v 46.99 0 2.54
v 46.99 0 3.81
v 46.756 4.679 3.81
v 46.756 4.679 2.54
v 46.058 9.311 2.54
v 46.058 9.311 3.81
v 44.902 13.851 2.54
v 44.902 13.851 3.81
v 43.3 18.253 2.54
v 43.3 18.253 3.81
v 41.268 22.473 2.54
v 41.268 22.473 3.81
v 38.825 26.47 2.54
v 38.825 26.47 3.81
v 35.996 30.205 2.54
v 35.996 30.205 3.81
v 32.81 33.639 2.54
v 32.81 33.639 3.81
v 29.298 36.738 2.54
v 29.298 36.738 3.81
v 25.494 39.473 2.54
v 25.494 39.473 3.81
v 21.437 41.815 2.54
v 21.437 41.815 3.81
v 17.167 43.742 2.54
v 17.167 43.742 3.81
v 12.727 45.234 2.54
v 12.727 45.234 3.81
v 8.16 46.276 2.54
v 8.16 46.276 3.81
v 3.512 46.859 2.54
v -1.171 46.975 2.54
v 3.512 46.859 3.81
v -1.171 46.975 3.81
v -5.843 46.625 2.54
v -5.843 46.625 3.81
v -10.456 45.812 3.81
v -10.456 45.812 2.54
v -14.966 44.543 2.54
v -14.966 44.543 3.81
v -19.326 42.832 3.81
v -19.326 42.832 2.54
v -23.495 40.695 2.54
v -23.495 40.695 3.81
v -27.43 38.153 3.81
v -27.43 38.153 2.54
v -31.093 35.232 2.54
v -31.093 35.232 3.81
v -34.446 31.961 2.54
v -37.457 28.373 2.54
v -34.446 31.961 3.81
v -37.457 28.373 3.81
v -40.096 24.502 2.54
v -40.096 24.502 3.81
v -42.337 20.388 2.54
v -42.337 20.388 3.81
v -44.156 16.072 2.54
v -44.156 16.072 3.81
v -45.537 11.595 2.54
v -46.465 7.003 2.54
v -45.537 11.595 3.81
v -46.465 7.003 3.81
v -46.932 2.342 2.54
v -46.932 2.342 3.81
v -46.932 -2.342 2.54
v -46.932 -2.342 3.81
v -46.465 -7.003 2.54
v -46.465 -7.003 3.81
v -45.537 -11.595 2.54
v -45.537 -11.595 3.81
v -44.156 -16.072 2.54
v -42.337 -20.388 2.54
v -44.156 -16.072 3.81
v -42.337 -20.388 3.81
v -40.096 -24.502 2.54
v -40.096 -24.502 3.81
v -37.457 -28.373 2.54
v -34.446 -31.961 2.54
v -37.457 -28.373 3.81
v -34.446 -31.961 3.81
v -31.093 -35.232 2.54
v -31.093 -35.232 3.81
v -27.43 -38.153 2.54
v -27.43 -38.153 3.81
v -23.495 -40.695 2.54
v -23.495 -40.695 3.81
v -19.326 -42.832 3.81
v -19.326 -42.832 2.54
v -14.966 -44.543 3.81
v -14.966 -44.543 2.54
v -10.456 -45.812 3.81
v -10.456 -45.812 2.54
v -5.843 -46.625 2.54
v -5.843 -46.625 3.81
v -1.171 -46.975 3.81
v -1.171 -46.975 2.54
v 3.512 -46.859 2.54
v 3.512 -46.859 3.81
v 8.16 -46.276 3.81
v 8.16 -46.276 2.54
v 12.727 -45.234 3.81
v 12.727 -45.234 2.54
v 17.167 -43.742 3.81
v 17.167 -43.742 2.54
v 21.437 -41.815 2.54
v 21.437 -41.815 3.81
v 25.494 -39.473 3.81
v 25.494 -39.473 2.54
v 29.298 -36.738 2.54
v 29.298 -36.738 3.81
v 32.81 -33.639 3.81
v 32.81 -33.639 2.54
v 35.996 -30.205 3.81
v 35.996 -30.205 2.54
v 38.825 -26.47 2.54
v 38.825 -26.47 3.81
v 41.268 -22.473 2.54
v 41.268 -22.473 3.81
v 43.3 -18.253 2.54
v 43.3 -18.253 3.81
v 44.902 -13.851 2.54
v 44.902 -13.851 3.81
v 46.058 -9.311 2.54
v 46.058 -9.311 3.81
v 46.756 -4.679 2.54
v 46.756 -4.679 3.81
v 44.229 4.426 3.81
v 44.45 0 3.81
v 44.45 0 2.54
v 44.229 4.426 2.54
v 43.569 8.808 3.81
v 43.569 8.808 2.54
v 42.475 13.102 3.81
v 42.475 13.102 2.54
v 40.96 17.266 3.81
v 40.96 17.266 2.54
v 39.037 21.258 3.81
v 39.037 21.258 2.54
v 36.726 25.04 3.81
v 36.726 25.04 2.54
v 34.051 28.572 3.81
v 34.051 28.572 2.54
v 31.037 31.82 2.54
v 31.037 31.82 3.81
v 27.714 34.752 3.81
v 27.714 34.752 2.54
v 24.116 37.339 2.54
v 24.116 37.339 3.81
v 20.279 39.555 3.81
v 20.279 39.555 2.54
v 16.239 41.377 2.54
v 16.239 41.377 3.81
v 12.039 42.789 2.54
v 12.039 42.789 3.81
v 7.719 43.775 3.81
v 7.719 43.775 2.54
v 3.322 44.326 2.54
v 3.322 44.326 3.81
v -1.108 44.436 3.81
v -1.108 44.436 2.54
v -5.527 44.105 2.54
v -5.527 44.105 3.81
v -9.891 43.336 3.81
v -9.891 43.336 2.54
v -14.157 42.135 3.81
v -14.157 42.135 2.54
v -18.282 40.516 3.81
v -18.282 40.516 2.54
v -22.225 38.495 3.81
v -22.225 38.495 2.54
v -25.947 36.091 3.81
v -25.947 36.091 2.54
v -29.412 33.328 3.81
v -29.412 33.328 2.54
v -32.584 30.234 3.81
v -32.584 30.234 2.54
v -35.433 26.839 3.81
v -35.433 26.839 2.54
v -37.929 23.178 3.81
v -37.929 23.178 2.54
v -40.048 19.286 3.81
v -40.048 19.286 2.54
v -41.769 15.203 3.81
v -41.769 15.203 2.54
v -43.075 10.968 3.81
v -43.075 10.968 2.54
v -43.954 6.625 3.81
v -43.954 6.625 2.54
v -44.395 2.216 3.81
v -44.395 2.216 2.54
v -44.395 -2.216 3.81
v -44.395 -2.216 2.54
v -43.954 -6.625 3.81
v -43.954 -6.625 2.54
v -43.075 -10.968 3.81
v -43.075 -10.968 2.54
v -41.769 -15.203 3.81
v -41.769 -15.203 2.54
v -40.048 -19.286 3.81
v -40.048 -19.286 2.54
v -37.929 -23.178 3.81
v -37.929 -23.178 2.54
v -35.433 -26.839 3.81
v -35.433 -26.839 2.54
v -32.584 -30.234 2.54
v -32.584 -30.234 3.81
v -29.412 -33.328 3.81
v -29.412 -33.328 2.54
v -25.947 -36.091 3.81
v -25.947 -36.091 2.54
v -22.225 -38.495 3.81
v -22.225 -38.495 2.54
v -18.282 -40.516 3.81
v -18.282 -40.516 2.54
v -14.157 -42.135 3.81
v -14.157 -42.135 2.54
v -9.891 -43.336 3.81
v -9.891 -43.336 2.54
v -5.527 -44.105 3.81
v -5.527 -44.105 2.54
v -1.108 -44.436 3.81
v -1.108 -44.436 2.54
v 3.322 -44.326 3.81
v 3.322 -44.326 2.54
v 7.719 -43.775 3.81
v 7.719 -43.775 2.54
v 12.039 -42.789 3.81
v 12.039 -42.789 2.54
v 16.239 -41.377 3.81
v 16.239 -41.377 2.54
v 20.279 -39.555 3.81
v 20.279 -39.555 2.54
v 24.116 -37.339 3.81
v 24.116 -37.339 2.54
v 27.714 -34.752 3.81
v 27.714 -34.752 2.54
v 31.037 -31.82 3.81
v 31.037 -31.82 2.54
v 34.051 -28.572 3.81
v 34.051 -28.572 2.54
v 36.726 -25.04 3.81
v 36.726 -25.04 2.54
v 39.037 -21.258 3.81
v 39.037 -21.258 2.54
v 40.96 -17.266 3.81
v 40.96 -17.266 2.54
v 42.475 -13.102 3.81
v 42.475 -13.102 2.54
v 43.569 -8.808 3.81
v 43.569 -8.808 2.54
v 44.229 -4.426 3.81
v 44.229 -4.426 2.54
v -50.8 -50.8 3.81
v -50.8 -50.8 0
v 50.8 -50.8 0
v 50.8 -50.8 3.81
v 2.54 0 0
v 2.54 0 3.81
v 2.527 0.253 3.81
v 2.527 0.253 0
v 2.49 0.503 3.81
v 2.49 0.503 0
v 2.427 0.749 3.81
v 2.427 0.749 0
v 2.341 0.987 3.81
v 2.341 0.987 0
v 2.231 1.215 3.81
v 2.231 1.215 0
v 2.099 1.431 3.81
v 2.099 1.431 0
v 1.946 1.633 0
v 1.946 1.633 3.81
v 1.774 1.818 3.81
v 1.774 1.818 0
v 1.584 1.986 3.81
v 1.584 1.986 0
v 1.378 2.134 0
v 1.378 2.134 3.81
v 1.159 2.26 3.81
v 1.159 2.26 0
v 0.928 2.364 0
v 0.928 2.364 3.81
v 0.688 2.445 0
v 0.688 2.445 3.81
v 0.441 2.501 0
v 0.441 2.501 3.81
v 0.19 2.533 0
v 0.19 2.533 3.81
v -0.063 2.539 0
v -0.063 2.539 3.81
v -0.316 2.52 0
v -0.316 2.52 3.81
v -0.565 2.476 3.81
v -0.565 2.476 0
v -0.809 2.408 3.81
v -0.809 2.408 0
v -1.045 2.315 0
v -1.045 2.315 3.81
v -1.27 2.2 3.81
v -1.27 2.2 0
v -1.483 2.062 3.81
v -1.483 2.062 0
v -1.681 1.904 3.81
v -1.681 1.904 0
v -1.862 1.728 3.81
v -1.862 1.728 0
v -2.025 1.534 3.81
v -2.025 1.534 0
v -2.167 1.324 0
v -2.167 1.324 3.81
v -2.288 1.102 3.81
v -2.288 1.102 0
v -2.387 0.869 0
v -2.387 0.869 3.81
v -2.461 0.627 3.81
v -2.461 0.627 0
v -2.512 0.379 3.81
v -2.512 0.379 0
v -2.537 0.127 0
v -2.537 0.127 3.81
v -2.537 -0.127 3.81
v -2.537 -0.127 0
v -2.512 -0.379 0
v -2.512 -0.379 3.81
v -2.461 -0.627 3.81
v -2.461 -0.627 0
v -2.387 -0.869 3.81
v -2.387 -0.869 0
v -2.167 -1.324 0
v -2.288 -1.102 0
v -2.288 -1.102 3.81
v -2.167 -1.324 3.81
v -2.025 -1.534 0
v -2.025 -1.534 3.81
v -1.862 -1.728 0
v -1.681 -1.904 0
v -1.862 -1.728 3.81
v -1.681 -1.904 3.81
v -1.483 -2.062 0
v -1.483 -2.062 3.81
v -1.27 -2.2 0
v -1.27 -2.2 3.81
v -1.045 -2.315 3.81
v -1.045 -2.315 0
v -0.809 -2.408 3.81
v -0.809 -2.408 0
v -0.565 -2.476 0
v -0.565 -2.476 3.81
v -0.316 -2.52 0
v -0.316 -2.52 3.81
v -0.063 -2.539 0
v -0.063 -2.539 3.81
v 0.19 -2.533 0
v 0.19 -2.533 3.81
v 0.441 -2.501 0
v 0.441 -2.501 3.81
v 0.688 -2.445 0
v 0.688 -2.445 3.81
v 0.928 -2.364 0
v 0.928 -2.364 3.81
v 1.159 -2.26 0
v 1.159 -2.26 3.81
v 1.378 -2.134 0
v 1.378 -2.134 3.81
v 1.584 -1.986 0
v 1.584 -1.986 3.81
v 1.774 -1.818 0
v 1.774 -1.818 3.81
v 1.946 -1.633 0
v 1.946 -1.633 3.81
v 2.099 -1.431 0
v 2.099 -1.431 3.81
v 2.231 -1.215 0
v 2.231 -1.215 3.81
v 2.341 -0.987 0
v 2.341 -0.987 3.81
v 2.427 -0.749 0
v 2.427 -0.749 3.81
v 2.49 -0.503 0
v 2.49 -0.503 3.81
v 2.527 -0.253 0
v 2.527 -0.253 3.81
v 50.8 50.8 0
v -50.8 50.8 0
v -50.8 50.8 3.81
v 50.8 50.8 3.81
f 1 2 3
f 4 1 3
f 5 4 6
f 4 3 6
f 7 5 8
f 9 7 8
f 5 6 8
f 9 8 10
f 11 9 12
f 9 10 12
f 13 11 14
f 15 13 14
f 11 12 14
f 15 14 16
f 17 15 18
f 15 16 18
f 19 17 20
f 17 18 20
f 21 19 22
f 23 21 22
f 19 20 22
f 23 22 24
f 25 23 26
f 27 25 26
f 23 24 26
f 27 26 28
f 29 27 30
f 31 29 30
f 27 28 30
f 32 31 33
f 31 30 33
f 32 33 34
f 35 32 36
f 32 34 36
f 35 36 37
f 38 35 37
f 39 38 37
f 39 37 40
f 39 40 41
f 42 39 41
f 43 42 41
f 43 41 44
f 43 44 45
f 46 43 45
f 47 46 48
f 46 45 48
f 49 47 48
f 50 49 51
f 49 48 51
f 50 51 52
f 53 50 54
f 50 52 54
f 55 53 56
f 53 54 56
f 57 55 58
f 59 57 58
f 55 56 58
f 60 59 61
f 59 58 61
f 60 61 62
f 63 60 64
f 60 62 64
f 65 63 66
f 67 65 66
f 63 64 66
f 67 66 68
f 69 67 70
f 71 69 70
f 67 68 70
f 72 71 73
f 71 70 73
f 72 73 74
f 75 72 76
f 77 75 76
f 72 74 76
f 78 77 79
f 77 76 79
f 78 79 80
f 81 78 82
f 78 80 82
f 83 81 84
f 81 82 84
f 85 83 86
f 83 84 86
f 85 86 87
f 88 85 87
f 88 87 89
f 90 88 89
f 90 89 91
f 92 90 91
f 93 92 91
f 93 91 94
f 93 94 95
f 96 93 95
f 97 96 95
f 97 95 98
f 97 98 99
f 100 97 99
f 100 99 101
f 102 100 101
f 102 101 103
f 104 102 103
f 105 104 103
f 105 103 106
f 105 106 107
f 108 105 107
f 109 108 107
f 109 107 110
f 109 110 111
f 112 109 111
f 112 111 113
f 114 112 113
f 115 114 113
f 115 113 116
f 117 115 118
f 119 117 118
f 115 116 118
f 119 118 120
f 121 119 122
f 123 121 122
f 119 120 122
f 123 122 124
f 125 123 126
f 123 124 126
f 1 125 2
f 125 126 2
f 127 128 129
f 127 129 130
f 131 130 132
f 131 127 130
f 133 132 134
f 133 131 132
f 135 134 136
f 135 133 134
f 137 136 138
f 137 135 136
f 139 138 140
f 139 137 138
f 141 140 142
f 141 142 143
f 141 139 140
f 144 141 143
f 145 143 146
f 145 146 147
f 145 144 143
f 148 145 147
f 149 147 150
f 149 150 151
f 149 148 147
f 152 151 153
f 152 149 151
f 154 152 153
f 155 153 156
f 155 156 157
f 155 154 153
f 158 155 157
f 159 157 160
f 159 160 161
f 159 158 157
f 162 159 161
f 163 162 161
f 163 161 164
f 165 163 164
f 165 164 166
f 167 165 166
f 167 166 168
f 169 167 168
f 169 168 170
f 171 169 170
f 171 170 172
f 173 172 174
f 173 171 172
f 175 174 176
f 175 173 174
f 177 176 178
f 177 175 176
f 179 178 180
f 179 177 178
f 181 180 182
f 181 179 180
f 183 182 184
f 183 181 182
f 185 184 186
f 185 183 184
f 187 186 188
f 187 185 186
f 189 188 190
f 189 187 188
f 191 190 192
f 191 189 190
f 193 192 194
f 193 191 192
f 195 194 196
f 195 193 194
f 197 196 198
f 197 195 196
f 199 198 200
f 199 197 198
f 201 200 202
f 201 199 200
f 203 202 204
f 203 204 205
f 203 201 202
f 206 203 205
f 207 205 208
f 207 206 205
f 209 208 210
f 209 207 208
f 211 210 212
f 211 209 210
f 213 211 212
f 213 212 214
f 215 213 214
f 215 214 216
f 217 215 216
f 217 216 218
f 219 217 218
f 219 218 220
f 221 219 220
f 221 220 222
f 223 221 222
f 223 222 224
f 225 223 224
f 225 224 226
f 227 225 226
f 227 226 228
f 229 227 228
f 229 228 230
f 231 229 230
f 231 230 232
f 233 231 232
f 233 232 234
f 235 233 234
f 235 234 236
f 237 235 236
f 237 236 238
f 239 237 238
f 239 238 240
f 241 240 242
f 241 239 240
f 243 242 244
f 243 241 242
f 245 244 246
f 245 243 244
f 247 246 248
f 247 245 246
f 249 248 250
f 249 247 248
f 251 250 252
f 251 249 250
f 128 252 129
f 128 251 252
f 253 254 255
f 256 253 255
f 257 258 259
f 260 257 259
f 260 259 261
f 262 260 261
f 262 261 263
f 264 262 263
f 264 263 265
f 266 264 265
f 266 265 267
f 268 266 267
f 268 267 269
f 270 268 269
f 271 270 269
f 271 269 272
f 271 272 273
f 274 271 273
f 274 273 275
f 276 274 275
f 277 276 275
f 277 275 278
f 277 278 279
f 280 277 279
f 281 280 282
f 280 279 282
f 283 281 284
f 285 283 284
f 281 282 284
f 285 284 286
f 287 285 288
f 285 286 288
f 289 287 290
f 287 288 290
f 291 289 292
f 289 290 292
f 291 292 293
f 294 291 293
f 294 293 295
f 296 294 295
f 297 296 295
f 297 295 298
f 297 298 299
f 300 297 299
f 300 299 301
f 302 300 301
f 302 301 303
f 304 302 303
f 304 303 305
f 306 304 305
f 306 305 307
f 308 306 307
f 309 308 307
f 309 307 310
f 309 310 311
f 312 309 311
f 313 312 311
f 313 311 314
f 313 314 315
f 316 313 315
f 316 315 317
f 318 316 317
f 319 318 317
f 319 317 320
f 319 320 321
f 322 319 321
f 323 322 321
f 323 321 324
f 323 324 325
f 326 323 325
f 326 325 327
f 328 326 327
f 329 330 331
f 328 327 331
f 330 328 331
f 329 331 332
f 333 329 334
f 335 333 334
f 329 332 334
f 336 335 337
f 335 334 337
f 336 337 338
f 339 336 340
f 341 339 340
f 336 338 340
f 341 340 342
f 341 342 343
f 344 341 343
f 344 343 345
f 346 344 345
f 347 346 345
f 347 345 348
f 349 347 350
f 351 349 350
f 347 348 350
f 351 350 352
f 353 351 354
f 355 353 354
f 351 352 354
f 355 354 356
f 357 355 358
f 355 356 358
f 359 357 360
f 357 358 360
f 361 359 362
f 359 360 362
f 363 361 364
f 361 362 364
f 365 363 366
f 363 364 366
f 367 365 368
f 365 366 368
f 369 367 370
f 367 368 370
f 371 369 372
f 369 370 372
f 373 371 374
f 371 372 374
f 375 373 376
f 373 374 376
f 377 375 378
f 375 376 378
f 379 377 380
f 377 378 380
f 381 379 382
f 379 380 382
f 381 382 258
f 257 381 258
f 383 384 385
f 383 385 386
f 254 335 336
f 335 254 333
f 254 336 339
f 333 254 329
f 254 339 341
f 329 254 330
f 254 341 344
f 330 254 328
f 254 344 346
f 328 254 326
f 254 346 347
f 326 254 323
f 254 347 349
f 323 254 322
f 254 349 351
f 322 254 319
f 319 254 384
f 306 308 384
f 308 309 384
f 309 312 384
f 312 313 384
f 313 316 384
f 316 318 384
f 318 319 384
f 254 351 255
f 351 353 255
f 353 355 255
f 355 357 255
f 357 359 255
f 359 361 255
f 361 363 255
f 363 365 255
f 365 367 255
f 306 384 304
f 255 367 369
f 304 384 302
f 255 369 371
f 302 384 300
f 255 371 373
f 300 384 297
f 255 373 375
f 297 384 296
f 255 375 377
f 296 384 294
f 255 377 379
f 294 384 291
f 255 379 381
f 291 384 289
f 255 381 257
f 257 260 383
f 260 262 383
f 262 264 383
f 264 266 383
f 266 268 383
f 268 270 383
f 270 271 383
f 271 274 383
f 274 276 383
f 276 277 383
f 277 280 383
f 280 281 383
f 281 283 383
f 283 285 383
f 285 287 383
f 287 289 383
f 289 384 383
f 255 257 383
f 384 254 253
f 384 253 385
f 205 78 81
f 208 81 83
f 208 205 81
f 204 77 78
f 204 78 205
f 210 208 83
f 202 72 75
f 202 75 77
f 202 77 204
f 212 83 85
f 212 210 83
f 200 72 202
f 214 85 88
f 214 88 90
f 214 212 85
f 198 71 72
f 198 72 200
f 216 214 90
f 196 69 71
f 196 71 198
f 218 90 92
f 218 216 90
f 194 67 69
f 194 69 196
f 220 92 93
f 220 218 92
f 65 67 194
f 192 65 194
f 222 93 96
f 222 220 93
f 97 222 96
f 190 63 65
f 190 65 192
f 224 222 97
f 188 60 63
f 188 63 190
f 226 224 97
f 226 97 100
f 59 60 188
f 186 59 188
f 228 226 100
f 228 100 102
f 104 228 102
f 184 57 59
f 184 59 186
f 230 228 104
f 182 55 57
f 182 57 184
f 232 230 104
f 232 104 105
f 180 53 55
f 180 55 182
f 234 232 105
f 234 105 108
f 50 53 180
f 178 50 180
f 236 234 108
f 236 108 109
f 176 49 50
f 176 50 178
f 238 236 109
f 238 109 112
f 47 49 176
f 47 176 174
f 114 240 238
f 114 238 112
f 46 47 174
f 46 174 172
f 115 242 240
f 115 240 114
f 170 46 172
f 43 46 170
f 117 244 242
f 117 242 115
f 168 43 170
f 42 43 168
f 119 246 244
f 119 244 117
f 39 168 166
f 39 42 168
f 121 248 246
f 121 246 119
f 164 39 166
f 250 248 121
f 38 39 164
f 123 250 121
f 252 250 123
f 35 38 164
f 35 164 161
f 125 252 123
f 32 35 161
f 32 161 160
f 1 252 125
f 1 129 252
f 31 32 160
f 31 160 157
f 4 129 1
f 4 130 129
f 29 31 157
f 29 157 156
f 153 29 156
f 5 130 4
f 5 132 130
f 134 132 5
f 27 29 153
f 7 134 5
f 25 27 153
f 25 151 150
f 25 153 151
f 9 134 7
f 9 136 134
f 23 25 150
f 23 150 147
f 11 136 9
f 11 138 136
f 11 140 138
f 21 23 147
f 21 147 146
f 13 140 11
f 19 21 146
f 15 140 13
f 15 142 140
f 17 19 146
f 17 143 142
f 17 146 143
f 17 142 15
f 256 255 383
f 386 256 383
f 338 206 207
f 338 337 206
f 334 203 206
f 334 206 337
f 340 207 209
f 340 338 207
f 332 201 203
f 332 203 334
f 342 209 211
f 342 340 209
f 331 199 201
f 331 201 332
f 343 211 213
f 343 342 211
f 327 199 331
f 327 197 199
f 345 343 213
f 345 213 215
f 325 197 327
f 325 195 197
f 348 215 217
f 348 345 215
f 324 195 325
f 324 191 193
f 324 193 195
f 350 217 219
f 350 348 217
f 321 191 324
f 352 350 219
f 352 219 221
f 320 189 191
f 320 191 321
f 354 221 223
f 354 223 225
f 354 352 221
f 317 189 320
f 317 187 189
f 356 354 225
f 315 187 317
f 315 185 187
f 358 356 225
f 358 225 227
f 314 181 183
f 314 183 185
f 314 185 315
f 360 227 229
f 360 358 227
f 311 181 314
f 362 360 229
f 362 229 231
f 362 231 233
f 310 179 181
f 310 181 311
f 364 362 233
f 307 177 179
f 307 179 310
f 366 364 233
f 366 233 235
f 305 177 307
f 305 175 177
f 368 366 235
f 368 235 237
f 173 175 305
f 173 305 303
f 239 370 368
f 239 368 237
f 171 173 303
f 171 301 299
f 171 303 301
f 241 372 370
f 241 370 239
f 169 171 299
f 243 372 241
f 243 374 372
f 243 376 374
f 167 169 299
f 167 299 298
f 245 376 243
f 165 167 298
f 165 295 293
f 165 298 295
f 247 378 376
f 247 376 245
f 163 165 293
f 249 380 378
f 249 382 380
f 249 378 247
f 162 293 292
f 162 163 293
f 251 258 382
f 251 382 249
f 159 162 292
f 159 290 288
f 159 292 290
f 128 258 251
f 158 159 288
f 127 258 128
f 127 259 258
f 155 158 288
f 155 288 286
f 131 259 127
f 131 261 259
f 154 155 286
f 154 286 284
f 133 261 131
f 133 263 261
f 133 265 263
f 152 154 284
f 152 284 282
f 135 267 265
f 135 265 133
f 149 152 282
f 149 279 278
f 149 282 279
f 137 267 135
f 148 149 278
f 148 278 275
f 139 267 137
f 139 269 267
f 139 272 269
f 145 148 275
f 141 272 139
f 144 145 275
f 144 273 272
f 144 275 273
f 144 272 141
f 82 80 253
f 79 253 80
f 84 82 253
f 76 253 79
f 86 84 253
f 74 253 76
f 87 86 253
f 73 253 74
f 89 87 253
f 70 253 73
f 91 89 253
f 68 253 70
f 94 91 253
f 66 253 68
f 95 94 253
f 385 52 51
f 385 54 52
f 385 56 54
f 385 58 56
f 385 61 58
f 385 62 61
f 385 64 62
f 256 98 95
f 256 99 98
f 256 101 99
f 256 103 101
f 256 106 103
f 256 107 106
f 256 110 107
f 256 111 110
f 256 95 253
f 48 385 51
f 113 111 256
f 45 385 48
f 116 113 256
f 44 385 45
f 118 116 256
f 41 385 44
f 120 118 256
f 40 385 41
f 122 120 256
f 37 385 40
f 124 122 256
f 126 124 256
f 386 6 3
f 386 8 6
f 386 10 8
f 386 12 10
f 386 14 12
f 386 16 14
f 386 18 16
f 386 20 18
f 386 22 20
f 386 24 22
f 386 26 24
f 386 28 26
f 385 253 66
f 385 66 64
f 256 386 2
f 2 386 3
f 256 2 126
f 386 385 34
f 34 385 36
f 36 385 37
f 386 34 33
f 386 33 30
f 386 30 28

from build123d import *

# Parameters (mm, degrees)
SKETCH2_W           = 101.6
SKETCH2_H           = 101.6
SLEEVE_DEPTH        = 3.81
SKETCH3_R           = 2.54
HOLE_DEPTH          = 72.943005914
SKETCH4_R           = 46.99
SKETCH4_R_2         = 44.45
VINYL_OUTLINE_DEPTH = 1.27


with BuildPart() as part:
    # Sketch2 → Sleeve (new body)
    with BuildSketch(Plane.XY):
        Rectangle(SKETCH2_W, SKETCH2_H)
    extrude(amount=SLEEVE_DEPTH)

    # Sketch3 → Hole (cut, through all)
    with BuildSketch(Plane.XY.offset(3.81)):
        Circle(SKETCH3_R)
    extrude(amount=-HOLE_DEPTH, mode=Mode.SUBTRACT)

    # Sketch4 → Vinyl Outline (cut)
    with BuildSketch(Plane.XY.offset(3.81)):
        Circle(SKETCH4_R)
        Circle(SKETCH4_R_2, mode=Mode.SUBTRACT)
    extrude(amount=-VINYL_OUTLINE_DEPTH, mode=Mode.SUBTRACT)


solid = part.part
